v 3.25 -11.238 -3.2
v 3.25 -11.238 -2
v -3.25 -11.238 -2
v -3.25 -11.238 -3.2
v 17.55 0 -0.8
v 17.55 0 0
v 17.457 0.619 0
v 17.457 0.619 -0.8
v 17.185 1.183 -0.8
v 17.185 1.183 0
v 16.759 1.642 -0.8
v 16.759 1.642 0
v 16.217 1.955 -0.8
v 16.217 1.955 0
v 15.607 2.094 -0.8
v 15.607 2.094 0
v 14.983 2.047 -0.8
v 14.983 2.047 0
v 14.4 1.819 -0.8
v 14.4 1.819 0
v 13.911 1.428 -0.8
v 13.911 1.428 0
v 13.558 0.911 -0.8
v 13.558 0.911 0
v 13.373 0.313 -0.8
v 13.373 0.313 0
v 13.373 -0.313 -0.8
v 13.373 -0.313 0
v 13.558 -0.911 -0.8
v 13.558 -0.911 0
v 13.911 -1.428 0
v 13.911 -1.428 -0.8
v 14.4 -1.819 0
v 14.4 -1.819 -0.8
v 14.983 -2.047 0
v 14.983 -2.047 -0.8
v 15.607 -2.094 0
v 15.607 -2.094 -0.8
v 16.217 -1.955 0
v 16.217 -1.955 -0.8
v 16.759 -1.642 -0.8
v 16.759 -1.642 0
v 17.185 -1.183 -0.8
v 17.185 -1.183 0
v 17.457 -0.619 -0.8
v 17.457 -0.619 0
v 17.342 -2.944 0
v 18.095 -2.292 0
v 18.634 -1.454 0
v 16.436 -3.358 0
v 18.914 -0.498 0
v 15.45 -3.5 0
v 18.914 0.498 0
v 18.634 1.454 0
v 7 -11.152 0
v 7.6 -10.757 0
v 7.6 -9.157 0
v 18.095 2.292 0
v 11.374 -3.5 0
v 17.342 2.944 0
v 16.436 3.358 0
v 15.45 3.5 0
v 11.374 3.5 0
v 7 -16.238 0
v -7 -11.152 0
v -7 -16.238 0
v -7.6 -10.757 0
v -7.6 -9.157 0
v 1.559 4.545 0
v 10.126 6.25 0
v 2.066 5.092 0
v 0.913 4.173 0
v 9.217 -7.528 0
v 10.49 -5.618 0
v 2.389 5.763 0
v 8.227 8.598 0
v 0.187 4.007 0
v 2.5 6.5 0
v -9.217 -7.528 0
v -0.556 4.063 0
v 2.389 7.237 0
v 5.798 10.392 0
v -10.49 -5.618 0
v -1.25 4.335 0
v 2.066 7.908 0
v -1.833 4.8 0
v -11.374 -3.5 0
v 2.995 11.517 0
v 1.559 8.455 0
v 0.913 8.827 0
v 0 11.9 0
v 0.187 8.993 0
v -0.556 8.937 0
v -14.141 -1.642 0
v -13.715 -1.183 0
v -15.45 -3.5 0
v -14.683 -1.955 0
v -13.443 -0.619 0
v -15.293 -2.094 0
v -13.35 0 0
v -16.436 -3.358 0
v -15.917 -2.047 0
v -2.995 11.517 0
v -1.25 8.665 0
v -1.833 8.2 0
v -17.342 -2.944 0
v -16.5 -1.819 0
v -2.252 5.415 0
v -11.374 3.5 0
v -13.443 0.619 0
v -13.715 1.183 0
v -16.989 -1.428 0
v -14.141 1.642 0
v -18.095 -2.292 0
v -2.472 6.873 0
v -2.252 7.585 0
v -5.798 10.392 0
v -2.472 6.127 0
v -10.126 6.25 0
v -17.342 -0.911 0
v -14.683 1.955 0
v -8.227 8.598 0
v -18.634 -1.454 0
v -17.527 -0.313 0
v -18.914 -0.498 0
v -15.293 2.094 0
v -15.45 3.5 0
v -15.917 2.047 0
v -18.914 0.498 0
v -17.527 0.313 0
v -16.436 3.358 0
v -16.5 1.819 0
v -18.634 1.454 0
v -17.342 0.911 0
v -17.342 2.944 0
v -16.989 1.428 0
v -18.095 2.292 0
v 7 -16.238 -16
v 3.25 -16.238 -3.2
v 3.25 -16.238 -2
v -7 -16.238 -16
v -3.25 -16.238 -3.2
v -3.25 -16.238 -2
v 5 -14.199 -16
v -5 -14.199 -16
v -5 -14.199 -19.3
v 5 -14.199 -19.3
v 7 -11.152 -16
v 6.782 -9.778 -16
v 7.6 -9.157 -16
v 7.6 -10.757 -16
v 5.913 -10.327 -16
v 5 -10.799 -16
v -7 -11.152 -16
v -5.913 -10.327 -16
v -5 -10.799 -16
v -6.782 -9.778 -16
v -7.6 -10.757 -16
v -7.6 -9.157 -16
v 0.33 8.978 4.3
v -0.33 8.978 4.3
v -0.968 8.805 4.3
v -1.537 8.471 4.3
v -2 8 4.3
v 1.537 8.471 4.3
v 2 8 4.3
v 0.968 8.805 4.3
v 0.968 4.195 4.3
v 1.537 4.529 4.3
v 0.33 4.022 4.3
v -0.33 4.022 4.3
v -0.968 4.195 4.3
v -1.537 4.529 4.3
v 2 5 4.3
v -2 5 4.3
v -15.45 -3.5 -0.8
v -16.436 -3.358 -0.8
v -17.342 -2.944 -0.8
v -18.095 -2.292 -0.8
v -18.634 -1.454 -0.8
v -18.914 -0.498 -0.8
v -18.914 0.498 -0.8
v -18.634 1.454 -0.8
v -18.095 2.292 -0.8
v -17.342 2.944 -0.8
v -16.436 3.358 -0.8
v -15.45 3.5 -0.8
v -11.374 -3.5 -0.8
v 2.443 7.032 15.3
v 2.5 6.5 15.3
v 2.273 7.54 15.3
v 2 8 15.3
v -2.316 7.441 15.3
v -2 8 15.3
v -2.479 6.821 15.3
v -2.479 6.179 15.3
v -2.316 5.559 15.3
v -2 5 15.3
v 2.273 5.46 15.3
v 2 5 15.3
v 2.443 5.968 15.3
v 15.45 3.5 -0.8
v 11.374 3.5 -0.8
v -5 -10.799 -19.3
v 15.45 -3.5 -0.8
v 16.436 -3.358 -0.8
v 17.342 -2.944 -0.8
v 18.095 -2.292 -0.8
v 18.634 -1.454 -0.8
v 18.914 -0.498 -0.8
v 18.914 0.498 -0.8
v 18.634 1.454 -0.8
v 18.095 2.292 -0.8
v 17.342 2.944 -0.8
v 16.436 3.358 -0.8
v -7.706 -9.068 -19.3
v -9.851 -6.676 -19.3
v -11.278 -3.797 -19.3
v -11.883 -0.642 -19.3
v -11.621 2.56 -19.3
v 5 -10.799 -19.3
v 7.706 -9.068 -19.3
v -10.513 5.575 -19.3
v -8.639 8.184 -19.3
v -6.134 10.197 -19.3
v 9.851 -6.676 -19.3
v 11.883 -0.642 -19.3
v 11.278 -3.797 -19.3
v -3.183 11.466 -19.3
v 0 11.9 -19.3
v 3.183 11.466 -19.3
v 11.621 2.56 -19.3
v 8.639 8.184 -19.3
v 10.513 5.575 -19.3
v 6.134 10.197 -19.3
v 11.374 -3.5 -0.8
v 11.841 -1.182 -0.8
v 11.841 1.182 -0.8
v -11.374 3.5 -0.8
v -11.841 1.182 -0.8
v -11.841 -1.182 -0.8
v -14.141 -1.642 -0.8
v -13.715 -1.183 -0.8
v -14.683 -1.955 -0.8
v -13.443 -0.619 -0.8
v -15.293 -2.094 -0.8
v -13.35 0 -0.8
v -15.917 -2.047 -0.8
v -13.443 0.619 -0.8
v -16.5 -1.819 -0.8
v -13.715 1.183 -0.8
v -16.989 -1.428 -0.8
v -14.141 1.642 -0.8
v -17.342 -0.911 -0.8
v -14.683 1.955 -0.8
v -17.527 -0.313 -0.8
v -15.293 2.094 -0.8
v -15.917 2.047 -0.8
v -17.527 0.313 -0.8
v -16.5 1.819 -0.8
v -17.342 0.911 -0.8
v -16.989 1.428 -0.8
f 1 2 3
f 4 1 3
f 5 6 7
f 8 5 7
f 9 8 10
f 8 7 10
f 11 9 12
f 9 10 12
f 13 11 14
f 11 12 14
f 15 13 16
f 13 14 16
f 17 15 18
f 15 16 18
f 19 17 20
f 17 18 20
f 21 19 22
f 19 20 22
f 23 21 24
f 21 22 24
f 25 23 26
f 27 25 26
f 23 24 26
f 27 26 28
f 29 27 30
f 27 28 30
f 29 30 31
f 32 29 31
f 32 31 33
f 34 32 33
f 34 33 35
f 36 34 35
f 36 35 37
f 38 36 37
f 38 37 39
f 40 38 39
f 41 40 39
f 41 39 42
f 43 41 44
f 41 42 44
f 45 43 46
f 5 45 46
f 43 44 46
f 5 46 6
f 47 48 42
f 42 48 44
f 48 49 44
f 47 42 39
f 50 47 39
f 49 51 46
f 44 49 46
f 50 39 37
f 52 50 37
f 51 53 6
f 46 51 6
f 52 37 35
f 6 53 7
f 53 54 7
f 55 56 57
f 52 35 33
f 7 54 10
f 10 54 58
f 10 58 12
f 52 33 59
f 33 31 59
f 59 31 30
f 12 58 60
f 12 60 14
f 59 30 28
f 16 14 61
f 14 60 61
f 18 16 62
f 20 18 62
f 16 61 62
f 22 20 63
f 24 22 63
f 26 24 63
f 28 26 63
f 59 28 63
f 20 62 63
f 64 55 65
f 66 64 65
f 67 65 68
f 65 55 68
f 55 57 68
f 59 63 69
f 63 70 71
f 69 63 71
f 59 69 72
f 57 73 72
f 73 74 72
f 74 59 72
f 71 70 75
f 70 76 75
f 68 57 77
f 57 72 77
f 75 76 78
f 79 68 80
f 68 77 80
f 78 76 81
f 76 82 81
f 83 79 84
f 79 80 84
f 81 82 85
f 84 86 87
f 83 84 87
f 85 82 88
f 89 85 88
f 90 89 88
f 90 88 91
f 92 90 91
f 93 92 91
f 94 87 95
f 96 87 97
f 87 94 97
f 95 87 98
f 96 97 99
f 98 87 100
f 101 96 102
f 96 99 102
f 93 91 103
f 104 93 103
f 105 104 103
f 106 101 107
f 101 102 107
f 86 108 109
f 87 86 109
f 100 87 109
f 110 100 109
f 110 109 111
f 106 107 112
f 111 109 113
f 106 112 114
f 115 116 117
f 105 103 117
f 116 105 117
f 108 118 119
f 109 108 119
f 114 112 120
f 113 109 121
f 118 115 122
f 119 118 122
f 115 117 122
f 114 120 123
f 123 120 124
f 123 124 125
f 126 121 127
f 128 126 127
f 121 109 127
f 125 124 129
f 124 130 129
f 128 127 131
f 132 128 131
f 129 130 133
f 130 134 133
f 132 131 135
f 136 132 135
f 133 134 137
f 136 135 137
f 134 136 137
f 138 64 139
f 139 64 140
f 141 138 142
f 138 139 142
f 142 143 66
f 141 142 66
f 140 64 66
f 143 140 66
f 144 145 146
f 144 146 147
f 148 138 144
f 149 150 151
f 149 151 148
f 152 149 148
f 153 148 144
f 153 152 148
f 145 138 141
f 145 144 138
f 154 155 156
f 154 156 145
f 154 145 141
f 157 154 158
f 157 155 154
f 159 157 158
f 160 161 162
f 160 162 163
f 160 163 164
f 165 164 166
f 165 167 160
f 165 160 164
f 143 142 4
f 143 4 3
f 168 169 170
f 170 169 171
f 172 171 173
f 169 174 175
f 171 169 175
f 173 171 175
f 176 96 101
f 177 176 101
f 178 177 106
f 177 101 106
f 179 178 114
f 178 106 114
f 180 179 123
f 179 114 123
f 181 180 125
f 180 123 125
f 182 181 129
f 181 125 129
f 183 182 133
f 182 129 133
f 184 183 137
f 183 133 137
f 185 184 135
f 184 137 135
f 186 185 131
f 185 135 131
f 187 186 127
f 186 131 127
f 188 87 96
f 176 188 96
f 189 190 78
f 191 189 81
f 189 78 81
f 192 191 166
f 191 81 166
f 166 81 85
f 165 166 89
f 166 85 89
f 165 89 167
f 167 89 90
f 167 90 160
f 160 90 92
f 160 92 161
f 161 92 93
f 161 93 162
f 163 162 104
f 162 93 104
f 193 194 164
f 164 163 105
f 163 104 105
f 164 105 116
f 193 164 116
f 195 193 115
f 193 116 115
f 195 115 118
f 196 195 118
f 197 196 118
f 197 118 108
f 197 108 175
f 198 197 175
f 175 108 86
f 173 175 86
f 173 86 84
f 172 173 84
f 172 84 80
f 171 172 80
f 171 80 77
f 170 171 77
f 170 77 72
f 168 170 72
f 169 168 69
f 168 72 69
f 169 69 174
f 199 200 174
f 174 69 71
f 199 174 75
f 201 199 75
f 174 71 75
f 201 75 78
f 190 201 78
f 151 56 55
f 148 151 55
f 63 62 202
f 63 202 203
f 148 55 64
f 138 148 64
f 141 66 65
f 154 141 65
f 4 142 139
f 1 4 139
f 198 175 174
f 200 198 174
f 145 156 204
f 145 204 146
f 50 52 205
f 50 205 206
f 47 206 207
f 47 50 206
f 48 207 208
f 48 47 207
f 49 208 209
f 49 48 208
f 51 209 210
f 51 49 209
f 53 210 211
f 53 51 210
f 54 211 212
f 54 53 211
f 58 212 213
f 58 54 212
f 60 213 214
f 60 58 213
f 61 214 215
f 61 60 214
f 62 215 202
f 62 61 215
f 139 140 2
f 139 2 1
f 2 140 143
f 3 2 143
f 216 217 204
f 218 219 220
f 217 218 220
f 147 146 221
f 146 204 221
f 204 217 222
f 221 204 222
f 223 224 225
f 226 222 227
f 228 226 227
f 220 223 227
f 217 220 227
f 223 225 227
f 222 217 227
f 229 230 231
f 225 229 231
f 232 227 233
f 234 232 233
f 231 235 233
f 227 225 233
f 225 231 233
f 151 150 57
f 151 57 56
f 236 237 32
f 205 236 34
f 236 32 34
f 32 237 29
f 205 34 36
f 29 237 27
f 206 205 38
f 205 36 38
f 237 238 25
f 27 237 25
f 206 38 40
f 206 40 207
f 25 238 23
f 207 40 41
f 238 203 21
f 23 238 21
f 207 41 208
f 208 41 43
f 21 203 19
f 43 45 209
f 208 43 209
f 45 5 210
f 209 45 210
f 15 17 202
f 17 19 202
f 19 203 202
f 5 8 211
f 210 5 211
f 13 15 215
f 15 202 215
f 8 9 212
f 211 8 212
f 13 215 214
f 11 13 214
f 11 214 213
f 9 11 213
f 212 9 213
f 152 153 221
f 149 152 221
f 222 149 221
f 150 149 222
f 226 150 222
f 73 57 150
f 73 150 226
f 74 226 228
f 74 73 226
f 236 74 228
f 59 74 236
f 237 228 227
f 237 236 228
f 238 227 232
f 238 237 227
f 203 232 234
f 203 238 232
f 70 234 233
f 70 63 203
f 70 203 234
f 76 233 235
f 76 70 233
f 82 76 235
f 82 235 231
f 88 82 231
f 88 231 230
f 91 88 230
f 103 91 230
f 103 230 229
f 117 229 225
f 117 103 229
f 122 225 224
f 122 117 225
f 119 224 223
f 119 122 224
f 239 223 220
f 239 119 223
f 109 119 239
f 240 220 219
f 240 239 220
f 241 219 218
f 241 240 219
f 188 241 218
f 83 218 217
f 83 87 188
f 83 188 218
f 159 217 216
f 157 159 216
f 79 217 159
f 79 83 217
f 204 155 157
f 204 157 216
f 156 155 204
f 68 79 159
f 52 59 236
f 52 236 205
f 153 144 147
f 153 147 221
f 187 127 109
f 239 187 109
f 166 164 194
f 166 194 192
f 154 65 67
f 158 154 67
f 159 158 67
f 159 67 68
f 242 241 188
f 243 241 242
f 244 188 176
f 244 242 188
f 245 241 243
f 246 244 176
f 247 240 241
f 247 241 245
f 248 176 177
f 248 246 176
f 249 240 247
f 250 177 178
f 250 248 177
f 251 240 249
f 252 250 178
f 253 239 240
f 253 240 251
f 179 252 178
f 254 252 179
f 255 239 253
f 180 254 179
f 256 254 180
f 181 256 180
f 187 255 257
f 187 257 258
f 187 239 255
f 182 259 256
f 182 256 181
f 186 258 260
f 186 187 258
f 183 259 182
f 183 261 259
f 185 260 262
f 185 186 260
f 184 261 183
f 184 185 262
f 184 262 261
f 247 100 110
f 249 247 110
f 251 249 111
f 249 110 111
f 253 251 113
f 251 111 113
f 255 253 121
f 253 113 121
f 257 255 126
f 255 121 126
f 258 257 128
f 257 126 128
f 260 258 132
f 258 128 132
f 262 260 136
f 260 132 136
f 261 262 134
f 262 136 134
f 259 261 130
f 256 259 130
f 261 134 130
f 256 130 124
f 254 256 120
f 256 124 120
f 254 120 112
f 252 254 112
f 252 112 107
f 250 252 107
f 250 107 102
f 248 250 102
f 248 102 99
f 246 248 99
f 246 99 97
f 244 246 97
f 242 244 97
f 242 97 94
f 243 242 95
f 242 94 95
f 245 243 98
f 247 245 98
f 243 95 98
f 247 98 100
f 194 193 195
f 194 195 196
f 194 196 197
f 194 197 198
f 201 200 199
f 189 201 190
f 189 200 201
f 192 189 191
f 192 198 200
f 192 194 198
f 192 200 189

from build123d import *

# Parameters (mm, degrees)
HOUSING_BOSS_EXTRUDE1_DEPTH           = 19.3
PLASTIC_SHEILDING_BOSS_EXTRUDE2_DEPTH = 16
SKETCH5_R                             = 2.1
MOUNTING_BRACKETS_BOSS_EXTRUDE3_DEPTH = 0.8
SKETCH6_R                             = 2.5
SHAFT_BOSS_EXTRUDE4_DEPTH             = 15.3
SHAFT_START                           = -11
SHAFT_EDGECUT_EXTRUDE1_DEPTH          = 11
CABLE_HOLE_CUT_EXTRUDE2_DEPTH         = 5


with BuildPart() as part:
    # Sketch2 → Housing Boss-Extrude1 (new body)
    with BuildSketch(Plane.XY):
        with BuildLine():
            Line((-5, -14.198611022), (0, -14.198611022))
            Line((0, -14.198611022), (5, -14.198611022))
            Line((5, -14.198611022), (5, -10.798611022))
            ThreePointArc((5, -10.798611022), (0, 11.9), (-5, -10.798611022))
            Line((-5, -10.798611022), (-5, -14.198611022))
        make_face()
    extrude(amount=-HOUSING_BOSS_EXTRUDE1_DEPTH)

    # Sketch4 → Plastic Sheilding Boss-Extrude2 (add)
    with BuildSketch(Plane.XY):
        with BuildLine():
            Line((0, -16.237711219), (-7, -16.237711219))
            Line((-7, -16.237711219), (-7, -11.151536254))
            Line((-7, -11.151536254), (-7.6, -10.756964563))
            Line((-7.6, -10.756964563), (-7.6, -9.156964563))
            ThreePointArc((-7.6, -9.156964563), (-6.353247262, -10.06211952), (-5, -10.798611022))
            Line((-5, -10.798611022), (-5, -14.198611022))
            Line((-5, -14.198611022), (5, -14.198611022))
            Line((5, -14.198611022), (5, -10.798611022))
            ThreePointArc((5, -10.798611022), (6.353247262, -10.06211952), (7.6, -9.156964563))
            Line((7.6, -9.156964563), (7.6, -10.756964563))
            Line((7.6, -10.756964563), (7, -11.151536254))
            Line((7, -11.151536254), (7, -16.237711219))
            Line((7, -16.237711219), (0, -16.237711219))
        make_face()
    extrude(amount=-PLASTIC_SHEILDING_BOSS_EXTRUDE2_DEPTH)

    # Sketch5 → Mounting Brackets Boss-Extrude3 (add)
    # profile 1 of 2: a face of its own
    with BuildSketch(Plane.XY):
        with BuildLine():
            Line((-15.45, 3.5), (-11.373653766, 3.5))
            ThreePointArc((-11.373653766, 3.5), (-11.9, 0), (-11.373653766, -3.5))
            Line((-11.373653766, -3.5), (-15.45, -3.5))
            ThreePointArc((-15.45, -3.5), (-18.95, 0), (-15.45, 3.5))
        make_face()
        with Locations((-15.45, 0)):
            Circle(SKETCH5_R, mode=Mode.SUBTRACT)
    # profile 2 of 2: a face of its own
    with BuildSketch(Plane.XY):
        with BuildLine():
            Line((15.45, 3.5), (11.373653766, 3.5))
            ThreePointArc((11.373653766, 3.5), (11.9, 0), (11.373653766, -3.5))
            Line((11.373653766, -3.5), (15.45, -3.5))
            ThreePointArc((15.45, -3.5), (18.95, 0), (15.45, 3.5))
        make_face()
        with Locations((15.45, 0)):
            Circle(SKETCH5_R, mode=Mode.SUBTRACT)
    extrude(amount=-MOUNTING_BRACKETS_BOSS_EXTRUDE3_DEPTH)

    # Sketch6 → Shaft Boss-Extrude4 (add)
    with BuildSketch(Plane.XY):
        with Locations((0, 6.5)):
            Circle(SKETCH6_R)
    extrude(amount=SHAFT_BOSS_EXTRUDE4_DEPTH)

    # Sketch7 → Shaft EdgeCut-Extrude1 (cut)
    with BuildSketch(Plane.XY.offset(15.3).offset(SHAFT_START)):
        with BuildLine():
            Line((-2, 8), (2, 8))
            ThreePointArc((2, 8), (0, 9), (-2, 8))
        make_face()
        with BuildLine():
            Line((-2, 5), (2, 5))
            ThreePointArc((2, 5), (0, 4), (-2, 5))
        make_face()
    extrude(amount=SHAFT_EDGECUT_EXTRUDE1_DEPTH, mode=Mode.SUBTRACT)

    # Sketch8 → Cable Hole Cut-Extrude2 (cut)
    with BuildSketch(Plane.XZ.offset(16.237711219)):
        Polygon((0, -2), (3.25, -2), (3.25, -3.2), (0, -3.2), (-3.25, -3.2), (-3.25, -2), align=None)
    extrude(amount=-CABLE_HOLE_CUT_EXTRUDE2_DEPTH, mode=Mode.SUBTRACT)


solid = part.part
